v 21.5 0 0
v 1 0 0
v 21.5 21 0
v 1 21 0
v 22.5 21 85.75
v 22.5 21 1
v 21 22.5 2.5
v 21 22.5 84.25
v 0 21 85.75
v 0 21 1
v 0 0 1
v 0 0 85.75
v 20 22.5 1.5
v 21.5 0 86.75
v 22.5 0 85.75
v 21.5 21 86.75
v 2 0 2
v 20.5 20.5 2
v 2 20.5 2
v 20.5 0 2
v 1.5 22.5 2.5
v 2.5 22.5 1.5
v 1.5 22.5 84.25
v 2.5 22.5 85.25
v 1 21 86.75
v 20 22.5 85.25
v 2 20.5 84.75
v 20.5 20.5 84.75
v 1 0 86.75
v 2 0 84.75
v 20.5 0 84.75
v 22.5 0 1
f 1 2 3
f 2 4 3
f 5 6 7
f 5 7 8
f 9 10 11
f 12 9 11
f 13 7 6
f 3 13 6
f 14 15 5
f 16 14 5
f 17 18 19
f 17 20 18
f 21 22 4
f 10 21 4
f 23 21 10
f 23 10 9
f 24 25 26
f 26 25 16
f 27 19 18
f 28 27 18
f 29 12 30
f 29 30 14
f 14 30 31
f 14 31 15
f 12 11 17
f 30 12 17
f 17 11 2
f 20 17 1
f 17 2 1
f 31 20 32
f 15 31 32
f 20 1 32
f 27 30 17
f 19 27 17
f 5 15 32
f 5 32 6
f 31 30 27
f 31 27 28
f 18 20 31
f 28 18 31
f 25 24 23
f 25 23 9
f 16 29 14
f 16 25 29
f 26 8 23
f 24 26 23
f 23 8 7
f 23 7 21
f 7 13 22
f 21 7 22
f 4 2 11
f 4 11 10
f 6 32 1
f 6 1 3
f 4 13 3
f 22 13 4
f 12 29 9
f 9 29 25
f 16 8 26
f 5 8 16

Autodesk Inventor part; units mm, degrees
ref_plane "YZ Plane" through (0, 0, 0) normal (1, 0, 0) x (0, 1, 0)
ref_plane "XZ Plane" through (0, 0, 0) normal (0, 1, 0) x (-1, 0, 0)
ref_plane "XY Plane" through (0, 0, 0) normal (0, 0, 1) x (1, 0, 0)
sketch "Sketch1" plane through (0, 0, 0) normal (0, 0, 1) x (1, 0, 0)
  line L0 (0, 0) -> (22.5, 0)
  line L1 (22.5, 0) -> (22.5, 22.5)
  line L2 (22.5, 22.5) -> (0, 22.5)
  line L3 (0, 22.5) -> (0, 0)
  line L4 (0, 0) -> (20.5, 0)
  line L5 (20.5, 0) -> (20.5, 2)
  line L6 (20.5, 2) -> (0, 2)
  line L7 (0, 2) -> (0, 0)
  line L8 (22.5, 0) -> (20.5, 0)
  line L9 (20.5, 0) -> (20.5, 20.5)
  line L10 (20.5, 20.5) -> (22.5, 20.5)
  line L11 (22.5, 20.5) -> (22.5, 0)
  line L12 (22.5, 22.5) -> (2, 22.5)
  line L13 (2, 22.5) -> (2, 20.5)
  line L14 (2, 20.5) -> (22.5, 20.5)
  line L15 (22.5, 20.5) -> (22.5, 22.5)
  line L16 (0, 22.5) -> (2, 22.5)
  line L17 (2, 22.5) -> (2, 2)
  line L18 (2, 2) -> (0, 2)
  line L19 (0, 2) -> (0, 22.5)
  line L20 (2, 2) -> (20.5, 2)
  line L21 (20.5, 2) -> (20.5, 20.5)
  line L22 (20.5, 20.5) -> (2, 20.5)
  line L23 (2, 20.5) -> (2, 2)
  dimension "d0" = 22.5
  dimension "d1" = 22.5
  dimension "d2" = 20.5
  dimension "d3" = 2
  dimension "d4" = 2
  dimension "d5" = 20.5
  dimension "d6" = 20.5
  dimension "d7" = 2
  dimension "d8" = 2
  dimension "d9" = 20.5
  dimension "d10" = 18.5
  dimension "d11" = 18.5
extrude "Extrusion1" add sketch "Sketch1" along normal blind 86.75
sketch "Sketch6" plane through (0, 0, 0) normal (0, -1, 0) x (1, 0, 0)
  line L0 (0, 0) -> (22.5, 0) projected
  line L1 (0, 0) -> (20.5, 0)
  line L2 (20.5, 0) -> (20.5, 2)
  line L3 (20.5, 2) -> (0, 2)
  line L4 (0, 2) -> (0, 0)
  line L5 (22.5, 0) -> (22.5, 86.75) projected
  line L6 (22.5, 0) -> (20.5, 0)
  line L7 (20.5, 0) -> (20.5, 84.75)
  line L8 (20.5, 84.75) -> (22.5, 84.75)
  line L9 (22.5, 84.75) -> (22.5, 0)
  line L10 (22.5, 86.75) -> (2, 86.75)
  line L11 (2, 86.75) -> (2, 84.75)
  line L12 (2, 84.75) -> (22.5, 84.75)
  line L13 (22.5, 84.75) -> (22.5, 86.75)
  line L14 (0, 0) -> (0, 86.75) projected
  line L15 (0, 86.75) -> (2, 86.75)
  line L16 (2, 86.75) -> (2, 2)
  line L17 (2, 2) -> (0, 2)
  line L18 (0, 2) -> (0, 86.75)
  line L19 (20.5, 84.75) -> (2, 84.75)
  line L20 (2, 84.75) -> (2, 2)
  line L21 (2, 2) -> (20.5, 2)
  line L22 (20.5, 2) -> (20.5, 84.75)
  dimension "d28" = 20.5
  dimension "d29" = 2
  dimension "d30" = 2
  dimension "d31" = 84.75
  dimension "d32" = 20.5
  dimension "d33" = 2
  dimension "d34" = 2
  dimension "d35" = 84.75
  dimension "d36" = 18.5
  dimension "d37" = 82.75
extrude "Extrusion5" cut sketch "Sketch6" against normal blind 20.5 contours L3 L16 L12 L7
chamfer "Chamfer1" distance 1.5 angle 45 4 edges at (11.25, 22.5, 0) (22.5, 22.5, 43.375) (0, 22.5, 43.375) (11.25, 22.5, 86.75)
chamfer "Chamfer2" distance 1 angle 45 4 edges at (0, 10.5, 86.75) (22.5, 10.5, 86.75) (0, 10.5, 0) (22.5, 10.5, 0)
chamfer "Chamfer3" distance 0.8165 angle 45 4 edges at (1, 22, 85.75) (21.5, 22, 85.75) (21.5, 22, 1) (1, 22, 1)
properties part number "1-Battery-Case"
